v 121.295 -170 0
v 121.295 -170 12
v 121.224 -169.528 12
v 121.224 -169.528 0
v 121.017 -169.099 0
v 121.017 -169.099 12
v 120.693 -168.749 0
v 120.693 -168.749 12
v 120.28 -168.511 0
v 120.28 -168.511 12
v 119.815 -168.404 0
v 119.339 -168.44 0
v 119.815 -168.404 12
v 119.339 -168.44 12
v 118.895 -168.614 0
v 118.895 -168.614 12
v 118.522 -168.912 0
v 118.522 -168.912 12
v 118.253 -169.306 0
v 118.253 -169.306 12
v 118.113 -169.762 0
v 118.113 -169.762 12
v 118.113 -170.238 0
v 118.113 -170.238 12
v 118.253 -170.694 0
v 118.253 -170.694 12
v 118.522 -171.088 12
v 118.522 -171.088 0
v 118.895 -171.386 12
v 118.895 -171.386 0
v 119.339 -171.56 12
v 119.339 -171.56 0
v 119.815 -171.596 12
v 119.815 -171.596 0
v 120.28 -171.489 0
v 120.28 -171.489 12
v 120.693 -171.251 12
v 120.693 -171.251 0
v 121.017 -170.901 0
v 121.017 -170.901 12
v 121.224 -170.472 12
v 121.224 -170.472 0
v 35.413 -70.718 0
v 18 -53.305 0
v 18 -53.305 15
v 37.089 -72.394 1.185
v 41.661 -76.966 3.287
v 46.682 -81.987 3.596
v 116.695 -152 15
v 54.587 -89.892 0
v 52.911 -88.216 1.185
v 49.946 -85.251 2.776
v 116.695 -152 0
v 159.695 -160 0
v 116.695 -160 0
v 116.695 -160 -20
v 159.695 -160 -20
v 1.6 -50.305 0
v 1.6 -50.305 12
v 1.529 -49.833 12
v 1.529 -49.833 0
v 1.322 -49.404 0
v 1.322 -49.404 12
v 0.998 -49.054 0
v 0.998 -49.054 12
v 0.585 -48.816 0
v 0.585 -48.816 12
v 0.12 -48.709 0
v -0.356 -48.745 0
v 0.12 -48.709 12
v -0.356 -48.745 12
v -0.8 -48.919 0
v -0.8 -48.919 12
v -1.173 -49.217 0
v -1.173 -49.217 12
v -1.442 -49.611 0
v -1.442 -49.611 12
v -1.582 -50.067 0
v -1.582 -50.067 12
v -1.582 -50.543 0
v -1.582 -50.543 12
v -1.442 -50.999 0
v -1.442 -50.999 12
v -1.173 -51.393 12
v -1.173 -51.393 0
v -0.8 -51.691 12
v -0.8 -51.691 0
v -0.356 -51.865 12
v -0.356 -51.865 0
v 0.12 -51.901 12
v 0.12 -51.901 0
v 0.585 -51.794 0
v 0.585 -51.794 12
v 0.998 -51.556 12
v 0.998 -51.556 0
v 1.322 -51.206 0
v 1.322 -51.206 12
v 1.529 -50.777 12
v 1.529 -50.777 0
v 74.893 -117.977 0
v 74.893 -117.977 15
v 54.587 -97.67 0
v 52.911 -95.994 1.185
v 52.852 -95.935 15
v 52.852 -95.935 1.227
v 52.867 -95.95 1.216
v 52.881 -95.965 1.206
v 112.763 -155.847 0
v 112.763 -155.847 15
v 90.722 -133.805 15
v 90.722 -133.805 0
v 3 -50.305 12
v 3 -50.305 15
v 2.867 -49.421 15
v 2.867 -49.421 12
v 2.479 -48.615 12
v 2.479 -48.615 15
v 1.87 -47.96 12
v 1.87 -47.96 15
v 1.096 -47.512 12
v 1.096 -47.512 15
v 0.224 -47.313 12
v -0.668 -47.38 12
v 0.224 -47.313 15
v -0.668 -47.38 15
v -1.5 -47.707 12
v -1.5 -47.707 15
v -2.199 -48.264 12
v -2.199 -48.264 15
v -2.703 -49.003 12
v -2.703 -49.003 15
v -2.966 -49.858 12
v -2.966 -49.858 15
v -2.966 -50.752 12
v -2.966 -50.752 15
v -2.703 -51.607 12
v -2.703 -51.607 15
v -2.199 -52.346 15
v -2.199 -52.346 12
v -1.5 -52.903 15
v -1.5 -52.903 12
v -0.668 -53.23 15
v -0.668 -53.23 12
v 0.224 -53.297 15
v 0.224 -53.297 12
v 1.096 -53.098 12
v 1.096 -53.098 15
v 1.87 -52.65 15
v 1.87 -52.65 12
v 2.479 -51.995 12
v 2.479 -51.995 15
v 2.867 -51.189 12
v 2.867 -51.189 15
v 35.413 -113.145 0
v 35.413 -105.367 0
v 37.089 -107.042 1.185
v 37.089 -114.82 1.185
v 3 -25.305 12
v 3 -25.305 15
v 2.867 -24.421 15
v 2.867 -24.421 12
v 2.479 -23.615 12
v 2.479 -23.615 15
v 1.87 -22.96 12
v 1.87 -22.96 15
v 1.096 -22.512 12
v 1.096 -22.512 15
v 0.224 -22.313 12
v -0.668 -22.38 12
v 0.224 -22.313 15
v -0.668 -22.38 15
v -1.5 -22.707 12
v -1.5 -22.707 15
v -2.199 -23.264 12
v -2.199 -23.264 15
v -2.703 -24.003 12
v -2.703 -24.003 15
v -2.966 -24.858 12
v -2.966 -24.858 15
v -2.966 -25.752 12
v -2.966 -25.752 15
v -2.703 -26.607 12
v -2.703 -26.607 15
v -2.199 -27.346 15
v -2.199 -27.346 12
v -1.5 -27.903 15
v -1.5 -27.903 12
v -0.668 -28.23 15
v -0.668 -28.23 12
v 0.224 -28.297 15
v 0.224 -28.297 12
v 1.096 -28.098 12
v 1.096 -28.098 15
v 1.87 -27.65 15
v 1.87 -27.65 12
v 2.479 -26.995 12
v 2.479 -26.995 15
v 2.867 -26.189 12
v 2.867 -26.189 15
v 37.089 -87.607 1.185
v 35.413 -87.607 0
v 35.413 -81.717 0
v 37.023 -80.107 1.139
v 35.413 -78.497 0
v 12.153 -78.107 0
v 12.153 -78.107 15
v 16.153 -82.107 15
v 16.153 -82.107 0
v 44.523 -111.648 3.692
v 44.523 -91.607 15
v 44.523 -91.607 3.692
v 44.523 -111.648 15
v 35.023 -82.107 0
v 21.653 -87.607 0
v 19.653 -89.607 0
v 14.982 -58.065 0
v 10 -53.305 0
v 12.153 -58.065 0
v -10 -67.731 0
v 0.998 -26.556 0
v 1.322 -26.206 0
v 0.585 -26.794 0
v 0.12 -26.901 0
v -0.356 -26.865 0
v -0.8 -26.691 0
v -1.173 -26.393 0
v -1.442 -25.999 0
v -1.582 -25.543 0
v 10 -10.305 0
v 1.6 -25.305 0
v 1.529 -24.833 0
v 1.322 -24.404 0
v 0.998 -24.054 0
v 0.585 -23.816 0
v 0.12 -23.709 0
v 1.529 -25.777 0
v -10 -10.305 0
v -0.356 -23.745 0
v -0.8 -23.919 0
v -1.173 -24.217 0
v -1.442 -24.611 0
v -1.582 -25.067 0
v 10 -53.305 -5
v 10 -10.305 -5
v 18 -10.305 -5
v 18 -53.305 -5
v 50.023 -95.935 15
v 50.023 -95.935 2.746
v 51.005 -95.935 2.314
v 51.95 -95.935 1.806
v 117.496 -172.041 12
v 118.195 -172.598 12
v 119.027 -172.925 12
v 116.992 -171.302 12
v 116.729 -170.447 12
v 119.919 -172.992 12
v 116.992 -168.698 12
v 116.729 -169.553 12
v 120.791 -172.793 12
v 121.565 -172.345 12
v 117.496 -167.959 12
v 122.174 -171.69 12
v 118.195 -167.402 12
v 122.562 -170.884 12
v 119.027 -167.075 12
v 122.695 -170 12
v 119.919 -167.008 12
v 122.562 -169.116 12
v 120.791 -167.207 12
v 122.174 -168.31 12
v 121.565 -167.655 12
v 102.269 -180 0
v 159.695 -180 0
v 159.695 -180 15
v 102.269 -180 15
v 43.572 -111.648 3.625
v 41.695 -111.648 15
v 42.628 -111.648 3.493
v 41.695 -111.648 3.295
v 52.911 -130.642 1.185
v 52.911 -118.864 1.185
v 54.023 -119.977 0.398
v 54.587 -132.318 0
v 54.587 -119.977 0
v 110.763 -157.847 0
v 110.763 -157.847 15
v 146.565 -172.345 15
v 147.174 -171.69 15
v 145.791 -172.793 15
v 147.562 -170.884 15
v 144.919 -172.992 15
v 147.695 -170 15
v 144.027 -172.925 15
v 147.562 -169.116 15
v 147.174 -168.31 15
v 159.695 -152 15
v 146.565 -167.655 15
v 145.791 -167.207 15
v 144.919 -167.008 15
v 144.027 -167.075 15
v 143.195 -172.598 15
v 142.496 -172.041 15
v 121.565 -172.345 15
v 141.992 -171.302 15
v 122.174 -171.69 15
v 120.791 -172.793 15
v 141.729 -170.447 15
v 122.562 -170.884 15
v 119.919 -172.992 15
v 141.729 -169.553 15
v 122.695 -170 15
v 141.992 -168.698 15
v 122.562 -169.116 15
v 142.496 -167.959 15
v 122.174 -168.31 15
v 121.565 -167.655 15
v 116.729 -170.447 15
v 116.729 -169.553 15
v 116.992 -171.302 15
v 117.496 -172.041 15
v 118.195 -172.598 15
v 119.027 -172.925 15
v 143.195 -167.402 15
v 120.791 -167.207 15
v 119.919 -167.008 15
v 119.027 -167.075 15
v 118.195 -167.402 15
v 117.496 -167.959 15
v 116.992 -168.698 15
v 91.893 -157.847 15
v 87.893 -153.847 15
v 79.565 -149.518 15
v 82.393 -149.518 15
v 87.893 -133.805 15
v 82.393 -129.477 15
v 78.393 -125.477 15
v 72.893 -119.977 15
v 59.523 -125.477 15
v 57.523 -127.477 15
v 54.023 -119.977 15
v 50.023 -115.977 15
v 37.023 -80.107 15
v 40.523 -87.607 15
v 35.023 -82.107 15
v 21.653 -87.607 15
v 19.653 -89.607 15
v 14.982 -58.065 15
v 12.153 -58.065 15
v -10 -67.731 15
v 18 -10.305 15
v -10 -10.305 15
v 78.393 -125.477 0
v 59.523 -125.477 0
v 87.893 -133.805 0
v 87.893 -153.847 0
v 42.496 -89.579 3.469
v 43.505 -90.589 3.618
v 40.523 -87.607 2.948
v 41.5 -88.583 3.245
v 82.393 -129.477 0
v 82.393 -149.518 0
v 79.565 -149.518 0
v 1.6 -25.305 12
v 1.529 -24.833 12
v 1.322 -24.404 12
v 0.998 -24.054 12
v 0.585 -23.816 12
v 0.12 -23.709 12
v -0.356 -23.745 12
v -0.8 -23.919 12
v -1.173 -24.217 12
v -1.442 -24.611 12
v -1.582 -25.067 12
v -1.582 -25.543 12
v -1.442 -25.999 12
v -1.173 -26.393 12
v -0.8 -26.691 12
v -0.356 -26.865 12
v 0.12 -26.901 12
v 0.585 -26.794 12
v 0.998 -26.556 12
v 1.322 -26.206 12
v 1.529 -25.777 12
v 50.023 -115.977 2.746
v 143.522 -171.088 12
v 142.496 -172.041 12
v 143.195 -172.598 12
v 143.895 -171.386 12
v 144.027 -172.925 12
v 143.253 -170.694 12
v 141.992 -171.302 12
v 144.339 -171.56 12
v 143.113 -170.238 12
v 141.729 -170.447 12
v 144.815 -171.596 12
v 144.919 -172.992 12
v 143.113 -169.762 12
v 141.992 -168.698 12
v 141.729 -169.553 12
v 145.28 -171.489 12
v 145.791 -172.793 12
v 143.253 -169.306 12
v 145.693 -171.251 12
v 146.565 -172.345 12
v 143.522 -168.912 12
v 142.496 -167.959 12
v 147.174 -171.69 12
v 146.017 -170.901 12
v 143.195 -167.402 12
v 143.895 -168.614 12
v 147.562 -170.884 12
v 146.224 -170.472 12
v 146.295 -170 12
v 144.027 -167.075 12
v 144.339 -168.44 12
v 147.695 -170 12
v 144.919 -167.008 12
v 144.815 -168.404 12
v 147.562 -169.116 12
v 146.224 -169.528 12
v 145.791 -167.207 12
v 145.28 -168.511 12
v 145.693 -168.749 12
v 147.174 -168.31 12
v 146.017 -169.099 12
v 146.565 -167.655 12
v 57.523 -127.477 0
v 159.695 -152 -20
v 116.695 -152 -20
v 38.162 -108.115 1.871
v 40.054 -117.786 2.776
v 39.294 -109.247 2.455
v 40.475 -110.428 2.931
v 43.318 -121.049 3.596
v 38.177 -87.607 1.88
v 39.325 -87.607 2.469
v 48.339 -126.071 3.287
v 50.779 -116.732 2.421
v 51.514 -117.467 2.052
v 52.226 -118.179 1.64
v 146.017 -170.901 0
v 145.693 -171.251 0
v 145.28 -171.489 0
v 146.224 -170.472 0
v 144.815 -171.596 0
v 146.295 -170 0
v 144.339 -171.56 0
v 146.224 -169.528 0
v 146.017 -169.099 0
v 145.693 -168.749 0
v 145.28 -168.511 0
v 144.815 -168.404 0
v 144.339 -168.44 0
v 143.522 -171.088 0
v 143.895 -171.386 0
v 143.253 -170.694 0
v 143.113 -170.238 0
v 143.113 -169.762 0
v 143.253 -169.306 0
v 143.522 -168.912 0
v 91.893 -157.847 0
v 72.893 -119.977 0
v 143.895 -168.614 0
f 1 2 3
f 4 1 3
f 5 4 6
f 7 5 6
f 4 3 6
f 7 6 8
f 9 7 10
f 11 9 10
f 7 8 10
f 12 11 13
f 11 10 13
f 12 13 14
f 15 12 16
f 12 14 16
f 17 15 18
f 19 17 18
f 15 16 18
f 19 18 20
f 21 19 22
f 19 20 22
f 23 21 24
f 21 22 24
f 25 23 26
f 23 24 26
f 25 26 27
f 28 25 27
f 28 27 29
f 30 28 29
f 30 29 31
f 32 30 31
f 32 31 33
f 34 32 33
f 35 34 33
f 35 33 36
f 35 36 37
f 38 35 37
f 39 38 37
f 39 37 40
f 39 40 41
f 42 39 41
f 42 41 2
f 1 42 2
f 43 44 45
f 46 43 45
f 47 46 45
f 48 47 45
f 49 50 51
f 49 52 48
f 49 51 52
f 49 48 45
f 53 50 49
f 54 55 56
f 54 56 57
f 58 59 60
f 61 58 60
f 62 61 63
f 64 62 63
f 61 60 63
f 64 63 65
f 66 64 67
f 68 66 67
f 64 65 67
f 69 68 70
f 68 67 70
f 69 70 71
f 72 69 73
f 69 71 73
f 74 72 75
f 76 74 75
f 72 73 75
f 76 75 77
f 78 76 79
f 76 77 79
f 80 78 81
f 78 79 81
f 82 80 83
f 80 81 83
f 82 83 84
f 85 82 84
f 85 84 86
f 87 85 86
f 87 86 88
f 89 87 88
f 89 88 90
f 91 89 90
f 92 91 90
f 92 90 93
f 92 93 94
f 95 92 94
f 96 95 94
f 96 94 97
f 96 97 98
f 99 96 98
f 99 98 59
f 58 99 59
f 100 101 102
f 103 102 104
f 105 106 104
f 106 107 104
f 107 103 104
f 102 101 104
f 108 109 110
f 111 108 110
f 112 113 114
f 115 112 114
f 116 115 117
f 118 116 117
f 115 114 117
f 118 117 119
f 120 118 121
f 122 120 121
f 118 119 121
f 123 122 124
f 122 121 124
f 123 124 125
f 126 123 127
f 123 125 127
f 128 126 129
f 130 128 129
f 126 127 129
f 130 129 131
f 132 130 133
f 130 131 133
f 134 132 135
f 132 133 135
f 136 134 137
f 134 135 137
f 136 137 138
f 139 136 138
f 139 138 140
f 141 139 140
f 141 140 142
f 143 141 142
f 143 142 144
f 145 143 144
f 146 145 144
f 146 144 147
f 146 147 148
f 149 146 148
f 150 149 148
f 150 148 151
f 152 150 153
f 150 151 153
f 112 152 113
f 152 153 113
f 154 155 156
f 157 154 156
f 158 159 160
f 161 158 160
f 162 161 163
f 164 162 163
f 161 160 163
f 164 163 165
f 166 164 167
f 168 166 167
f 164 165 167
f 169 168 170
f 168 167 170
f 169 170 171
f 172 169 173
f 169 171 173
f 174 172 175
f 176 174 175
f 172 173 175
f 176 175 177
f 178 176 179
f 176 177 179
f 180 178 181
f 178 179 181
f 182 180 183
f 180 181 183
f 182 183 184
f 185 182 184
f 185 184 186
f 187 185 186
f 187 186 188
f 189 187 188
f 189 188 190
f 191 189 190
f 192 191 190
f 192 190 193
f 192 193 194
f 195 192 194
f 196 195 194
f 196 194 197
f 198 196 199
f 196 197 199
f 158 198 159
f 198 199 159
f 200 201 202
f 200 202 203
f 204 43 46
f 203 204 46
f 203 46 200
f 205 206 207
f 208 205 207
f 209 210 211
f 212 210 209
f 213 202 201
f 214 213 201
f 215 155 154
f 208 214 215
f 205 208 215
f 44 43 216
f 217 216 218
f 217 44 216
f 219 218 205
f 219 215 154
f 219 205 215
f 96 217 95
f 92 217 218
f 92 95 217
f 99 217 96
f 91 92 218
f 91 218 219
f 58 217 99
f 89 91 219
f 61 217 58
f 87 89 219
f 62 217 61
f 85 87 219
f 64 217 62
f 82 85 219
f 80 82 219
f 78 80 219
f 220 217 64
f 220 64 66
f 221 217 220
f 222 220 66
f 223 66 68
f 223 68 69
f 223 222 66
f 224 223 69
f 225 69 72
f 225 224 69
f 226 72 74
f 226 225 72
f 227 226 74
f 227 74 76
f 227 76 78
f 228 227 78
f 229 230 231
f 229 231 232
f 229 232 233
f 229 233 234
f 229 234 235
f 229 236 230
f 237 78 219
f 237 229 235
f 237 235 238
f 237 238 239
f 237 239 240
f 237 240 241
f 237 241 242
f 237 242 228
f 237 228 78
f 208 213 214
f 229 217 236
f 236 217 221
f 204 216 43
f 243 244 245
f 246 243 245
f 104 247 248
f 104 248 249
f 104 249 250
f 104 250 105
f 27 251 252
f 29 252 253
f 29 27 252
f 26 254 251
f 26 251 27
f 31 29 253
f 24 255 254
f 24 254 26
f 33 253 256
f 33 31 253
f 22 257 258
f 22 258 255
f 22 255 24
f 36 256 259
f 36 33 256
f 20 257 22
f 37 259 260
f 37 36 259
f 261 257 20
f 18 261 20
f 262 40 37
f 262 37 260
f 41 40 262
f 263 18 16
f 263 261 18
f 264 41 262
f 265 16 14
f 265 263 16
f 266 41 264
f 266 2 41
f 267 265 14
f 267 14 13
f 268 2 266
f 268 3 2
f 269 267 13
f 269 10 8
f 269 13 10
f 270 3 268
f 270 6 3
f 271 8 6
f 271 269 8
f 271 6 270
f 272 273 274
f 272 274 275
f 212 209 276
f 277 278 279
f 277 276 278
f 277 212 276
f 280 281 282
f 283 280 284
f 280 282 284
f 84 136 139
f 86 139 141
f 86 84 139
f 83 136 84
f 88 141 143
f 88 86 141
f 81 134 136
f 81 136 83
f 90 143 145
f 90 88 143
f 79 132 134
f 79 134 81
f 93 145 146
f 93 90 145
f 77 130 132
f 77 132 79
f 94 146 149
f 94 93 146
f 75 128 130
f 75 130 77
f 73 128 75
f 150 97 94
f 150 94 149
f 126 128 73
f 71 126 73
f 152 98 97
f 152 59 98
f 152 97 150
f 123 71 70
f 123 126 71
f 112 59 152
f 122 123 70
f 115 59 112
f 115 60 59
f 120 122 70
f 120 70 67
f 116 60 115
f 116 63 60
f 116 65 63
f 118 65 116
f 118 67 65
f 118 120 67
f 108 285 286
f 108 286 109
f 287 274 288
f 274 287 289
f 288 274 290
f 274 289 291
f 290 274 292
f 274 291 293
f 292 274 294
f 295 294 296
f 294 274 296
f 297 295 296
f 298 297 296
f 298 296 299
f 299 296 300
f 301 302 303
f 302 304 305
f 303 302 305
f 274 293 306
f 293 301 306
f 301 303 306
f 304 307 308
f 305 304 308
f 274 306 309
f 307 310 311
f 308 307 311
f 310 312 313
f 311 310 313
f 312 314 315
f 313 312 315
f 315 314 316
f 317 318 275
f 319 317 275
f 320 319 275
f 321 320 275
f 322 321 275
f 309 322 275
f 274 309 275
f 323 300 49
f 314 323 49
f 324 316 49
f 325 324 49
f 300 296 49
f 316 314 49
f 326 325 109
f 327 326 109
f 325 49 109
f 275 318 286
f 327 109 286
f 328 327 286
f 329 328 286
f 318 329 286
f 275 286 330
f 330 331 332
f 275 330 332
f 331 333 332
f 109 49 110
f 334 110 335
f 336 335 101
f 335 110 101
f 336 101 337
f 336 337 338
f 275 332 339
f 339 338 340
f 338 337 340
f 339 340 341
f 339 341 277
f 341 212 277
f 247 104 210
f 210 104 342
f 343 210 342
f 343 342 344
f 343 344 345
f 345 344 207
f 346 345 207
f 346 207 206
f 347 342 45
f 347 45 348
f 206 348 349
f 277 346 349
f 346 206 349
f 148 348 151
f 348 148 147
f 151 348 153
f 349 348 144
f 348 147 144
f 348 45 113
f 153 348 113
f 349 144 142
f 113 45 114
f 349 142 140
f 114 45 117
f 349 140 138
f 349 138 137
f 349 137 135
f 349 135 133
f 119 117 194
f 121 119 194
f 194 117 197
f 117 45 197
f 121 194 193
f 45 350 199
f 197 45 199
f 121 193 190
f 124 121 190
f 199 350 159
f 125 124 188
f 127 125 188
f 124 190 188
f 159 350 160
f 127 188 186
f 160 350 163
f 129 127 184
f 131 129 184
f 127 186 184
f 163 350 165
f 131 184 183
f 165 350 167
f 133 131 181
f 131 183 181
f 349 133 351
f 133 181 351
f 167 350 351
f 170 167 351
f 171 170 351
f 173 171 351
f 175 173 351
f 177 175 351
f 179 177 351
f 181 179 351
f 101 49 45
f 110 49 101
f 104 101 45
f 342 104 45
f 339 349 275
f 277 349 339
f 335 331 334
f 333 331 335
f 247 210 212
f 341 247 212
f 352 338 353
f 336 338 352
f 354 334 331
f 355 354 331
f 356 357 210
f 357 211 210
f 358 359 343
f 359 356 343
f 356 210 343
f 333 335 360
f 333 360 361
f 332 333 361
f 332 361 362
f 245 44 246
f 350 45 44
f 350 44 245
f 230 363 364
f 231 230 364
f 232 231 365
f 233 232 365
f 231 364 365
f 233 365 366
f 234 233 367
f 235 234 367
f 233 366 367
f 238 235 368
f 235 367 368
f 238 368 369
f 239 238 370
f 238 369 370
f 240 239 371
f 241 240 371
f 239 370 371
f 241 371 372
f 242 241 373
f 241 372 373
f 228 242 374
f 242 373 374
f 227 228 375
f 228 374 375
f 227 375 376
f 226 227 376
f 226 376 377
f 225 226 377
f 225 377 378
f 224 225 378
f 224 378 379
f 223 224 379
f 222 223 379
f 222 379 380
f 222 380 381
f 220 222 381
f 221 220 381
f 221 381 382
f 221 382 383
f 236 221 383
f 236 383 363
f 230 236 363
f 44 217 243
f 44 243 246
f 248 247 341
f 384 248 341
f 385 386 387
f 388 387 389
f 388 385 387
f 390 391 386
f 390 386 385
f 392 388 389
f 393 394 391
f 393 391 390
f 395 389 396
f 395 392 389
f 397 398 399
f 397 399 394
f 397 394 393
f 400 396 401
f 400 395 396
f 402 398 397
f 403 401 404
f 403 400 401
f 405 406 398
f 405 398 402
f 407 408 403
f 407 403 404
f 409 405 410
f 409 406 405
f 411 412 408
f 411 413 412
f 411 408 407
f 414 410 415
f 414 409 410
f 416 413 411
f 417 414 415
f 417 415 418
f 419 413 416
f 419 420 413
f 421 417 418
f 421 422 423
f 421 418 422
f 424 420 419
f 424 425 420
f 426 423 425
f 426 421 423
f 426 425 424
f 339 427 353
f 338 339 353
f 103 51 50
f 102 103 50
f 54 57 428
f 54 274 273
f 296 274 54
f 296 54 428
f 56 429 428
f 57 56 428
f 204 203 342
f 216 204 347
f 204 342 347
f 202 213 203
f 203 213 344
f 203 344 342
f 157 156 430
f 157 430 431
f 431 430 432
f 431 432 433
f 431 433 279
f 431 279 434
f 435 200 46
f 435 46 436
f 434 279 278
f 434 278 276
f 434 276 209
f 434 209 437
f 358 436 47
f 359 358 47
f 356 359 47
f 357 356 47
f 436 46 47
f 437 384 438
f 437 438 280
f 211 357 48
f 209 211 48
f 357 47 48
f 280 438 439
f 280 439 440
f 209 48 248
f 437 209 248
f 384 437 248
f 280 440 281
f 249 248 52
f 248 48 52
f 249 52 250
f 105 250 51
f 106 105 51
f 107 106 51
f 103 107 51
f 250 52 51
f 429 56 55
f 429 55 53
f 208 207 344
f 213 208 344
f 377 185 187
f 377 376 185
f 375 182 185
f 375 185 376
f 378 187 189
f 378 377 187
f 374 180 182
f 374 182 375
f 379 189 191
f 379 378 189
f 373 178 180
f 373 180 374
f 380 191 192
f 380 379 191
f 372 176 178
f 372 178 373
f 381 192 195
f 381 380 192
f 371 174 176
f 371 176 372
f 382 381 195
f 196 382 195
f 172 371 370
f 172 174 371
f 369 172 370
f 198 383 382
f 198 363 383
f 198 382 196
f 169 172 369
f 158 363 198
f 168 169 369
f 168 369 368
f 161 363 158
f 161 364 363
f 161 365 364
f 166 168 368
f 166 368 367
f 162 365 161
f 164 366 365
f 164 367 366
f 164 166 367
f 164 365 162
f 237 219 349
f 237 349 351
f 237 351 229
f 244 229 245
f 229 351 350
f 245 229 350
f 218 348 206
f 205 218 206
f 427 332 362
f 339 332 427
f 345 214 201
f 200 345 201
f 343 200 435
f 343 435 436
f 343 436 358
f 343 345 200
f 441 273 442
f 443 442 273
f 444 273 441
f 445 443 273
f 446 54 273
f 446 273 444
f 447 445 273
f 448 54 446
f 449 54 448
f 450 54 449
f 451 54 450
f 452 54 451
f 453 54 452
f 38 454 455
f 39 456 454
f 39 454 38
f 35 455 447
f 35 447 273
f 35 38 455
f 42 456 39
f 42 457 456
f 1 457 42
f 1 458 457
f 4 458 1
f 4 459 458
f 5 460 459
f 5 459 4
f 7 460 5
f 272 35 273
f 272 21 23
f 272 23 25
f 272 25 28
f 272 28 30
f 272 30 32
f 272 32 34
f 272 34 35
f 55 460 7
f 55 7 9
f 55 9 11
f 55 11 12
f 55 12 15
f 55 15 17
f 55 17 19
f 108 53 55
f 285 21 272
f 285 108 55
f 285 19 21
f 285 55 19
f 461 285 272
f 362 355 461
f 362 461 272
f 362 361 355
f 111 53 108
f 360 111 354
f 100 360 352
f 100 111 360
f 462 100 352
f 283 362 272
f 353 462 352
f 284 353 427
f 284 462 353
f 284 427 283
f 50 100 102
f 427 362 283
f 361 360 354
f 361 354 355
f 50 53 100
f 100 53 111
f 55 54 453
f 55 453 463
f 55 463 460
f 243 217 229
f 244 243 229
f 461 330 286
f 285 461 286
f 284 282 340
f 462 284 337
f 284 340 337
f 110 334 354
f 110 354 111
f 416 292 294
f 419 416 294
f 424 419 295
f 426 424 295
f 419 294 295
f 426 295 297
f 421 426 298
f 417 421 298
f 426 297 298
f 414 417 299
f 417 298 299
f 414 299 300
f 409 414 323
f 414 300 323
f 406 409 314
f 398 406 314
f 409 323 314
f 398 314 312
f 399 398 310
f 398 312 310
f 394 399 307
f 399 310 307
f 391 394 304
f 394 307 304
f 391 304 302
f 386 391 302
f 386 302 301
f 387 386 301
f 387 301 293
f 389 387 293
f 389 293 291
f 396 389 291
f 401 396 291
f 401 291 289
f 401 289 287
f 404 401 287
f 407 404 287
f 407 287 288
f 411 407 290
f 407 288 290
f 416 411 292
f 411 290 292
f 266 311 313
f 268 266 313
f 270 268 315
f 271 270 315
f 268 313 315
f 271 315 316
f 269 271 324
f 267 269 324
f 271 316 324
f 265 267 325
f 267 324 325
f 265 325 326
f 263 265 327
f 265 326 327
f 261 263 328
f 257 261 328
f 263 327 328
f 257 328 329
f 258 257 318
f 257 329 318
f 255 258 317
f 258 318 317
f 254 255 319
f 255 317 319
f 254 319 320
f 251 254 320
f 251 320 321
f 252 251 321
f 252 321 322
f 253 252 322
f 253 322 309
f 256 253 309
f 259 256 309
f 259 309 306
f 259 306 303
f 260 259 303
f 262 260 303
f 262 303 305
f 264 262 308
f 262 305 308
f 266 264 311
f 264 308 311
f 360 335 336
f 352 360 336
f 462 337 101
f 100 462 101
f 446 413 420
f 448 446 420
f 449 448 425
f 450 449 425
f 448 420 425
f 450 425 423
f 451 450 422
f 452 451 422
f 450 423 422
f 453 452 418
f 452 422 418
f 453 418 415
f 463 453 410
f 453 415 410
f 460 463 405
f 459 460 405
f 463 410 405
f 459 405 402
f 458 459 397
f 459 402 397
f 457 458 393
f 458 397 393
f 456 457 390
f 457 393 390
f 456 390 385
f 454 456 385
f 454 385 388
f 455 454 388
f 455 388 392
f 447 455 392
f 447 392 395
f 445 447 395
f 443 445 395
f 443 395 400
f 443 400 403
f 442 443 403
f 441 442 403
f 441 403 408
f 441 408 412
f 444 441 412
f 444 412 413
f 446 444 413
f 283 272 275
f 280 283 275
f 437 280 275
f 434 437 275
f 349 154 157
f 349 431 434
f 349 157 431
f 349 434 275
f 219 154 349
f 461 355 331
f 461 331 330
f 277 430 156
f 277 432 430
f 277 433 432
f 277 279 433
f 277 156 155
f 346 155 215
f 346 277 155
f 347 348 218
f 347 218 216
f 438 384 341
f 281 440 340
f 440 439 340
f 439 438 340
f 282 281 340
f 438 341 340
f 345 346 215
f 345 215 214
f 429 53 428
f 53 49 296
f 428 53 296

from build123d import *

# Parameters (mm, degrees)
EXTRUDE_1_DEPTH     = 15
SKETCH_3_W          = 43
SKETCH_3_H          = 8
EXTRUDE_2_DEPTH     = 35
SKETCH_4_W          = 8
SKETCH_4_H          = 43
EXTRUDE_3_DEPTH     = 35
CUT_EXTRUDE_1_DEPTH = 244.161454645
SKETCH_6_R          = 1.6
CUT_EXTRUDE_2_DEPTH = 244.161454645
SKETCH_7_R          = 3
CUT_EXTRUDE_3_DEPTH = 3
CHAMFER_1_SIZE      = 2.828427125
CHAMFER_1_SIZE_2    = 4
CUT_EXTRUDE_4_DEPTH = 133
SKETCH_10_W         = 8
SKETCH_10_H         = 15
CUT_EXTRUDE_5_DEPTH = 43


with BuildPart() as part:
    # 草图1 → 凸台-拉伸1 (new body)
    with BuildSketch(Plane.XY):
        Polygon((124.695, -160), (159.695, -160), (159.695, -180), (102.268593129, -180), (-10, -67.731406871), (-10, -10.305), (10, -10.305), (10, -45.305), align=None)
    extrude(amount=EXTRUDE_1_DEPTH)

    # 草图3 → 凸台-拉伸2 (add)
    with BuildSketch(Plane.XY.offset(15)):
        with Locations((138.195, -156)):
            Rectangle(SKETCH_3_W, SKETCH_3_H)
    extrude(amount=-EXTRUDE_2_DEPTH)

    # 草图4 → 凸台-拉伸3 (add)
    with BuildSketch(Plane.XY.offset(15)):
        with Locations((14, -31.805)):
            Rectangle(SKETCH_4_W, SKETCH_4_H)
    extrude(amount=-EXTRUDE_3_DEPTH)

    # 草图5 → 切除-拉伸1 (cut, through all)
    with BuildSketch(Plane.XY.offset(15)):
        Polygon((50.023383861, -93.106558454), (50.023383861, -119.976616139), (76.893441546, -119.976616139), align=None)
        Polygon((55.523383861, -125.476616139), (82.393441546, -125.476616139), (82.393441546, -152.346673824), align=None)
        Polygon((12.153326176, -55.236500769), (12.153326176, -82.106558454), (39.023383861, -82.106558454), align=None)
        Polygon((87.893441546, -130.976616139), (87.893441546, -157.846673824), (114.763499231, -157.846673824), align=None)
        Polygon((17.653326176, -87.606558454), (44.523383861, -87.606558454), (44.523383861, -114.476616139), align=None)
    extrude(amount=-CUT_EXTRUDE_1_DEPTH, mode=Mode.SUBTRACT)

    # 草图6 → 切除-拉伸2 (cut, through all)
    with BuildSketch(Plane.XY.offset(15)):
        with Locations((0, -50.305)):
            Circle(SKETCH_6_R)
        with Locations((0, -25.305)):
            Circle(SKETCH_6_R)
        with Locations((119.695, -170)):
            Circle(SKETCH_6_R)
        with Locations((144.695, -170)):
            Circle(SKETCH_6_R)
    extrude(amount=-CUT_EXTRUDE_2_DEPTH, mode=Mode.SUBTRACT)

    # 草图7 → 切除-拉伸3 (cut)
    with BuildSketch(Plane.XY.offset(15)):
        with Locations((0, -25.305)):
            Circle(SKETCH_7_R)
        with Locations((0, -50.305)):
            Circle(SKETCH_7_R)
        with Locations((119.695, -170)):
            Circle(SKETCH_7_R)
        with Locations((144.695, -170)):
            Circle(SKETCH_7_R)
    extrude(amount=-CUT_EXTRUDE_3_DEPTH, mode=Mode.SUBTRACT)

    # 倒角1
    # the kernel refuses this chamfer: 4, 2.828427125 mm, written as the material it adds along each edge
    with BuildSketch(Plane(origin=(82.393441546, -152.346673824, 15), x_dir=(0.05647824947248942, 0.9984038297885898, 0), z_dir=(0, 0, -1)), Plane(origin=(55.523383861, -125.476616139, 15), x_dir=(0.6660419652145875, -0.7459142715976752, 0), z_dir=(0, 0, -1)), Plane(origin=(87.893441546, -130.976616139, 15), x_dir=(-0.05647824947248942, -0.9984038297885898, 0), z_dir=(0, 0, -1)), Plane(origin=(12.153326176, -55.236500769, 15), x_dir=(-0.05647824947249038, -0.9984038297885897, 0), z_dir=(0, 0, -1)), Plane(origin=(44.523383861, -114.476616139, 15), x_dir=(0.05647824947248914, 0.9984038297885898, 0), z_dir=(0, 0, -1)), Plane(origin=(17.653326176, -87.606558454, 15), x_dir=(0.6660419652145882, -0.7459142715976745, 0), z_dir=(0, 0, -1)), Plane(origin=(50.023383861, -93.106558454, 15), x_dir=(-0.05647824947248914, -0.9984038297885898, 0), z_dir=(0, 0, -1))) as chamfer_1_piece_1:
        Polygon((CHAMFER_1_SIZE * 0.998403829699, -CHAMFER_1_SIZE * 0.0564782494674), (CHAMFER_1_SIZE_2 * 0.666041965215, -CHAMFER_1_SIZE_2 * 0.745914271598), (0, 0), align=None)
    extrude(amount=15)
    with BuildSketch(Plane(origin=(82.393441546, -125.476616139, 15), x_dir=(0.02749587661058555, -0.9996219169112968, 0), z_dir=(0, 0, -1)), Plane(origin=(87.893441546, -157.846673824, 15), x_dir=(-0.02749587661058555, 0.9996219169112968, 0), z_dir=(0, 0, -1)), Plane(origin=(12.153326176, -82.106558454, 15), x_dir=(-0.02749587661058651, 0.9996219169112968, 0), z_dir=(0, 0, -1)), Plane(origin=(44.523383861, -87.606558454, 15), x_dir=(0.027495876610585647, -0.9996219169112968, 0), z_dir=(0, 0, -1)), Plane(origin=(50.023383861, -119.976616139, 15), x_dir=(-0.027495876610585647, 0.9996219169112968, 0), z_dir=(0, 0, -1))) as chamfer_1_piece_2:
        Polygon((CHAMFER_1_SIZE_2 * 0.999621916911, CHAMFER_1_SIZE_2 * 0.0274958766106), (-CHAMFER_1_SIZE_2 * 0.0274958766106, CHAMFER_1_SIZE_2 * 0.999621916911), (0, 0), align=None)
    extrude(amount=15)
    with BuildSketch(Plane(origin=(114.763499231, -157.846673824, 15), x_dir=(-0.9996219169112968, -0.0274958766105891, 0), z_dir=(0, 0, -1)), Plane(origin=(39.023383861, -82.106558454, 15), x_dir=(-0.9996219169112968, -0.027495876610585647, 0), z_dir=(0, 0, -1)), Plane(origin=(76.893441546, -119.976616139, 15), x_dir=(-0.9996219169112968, -0.027495876610585647, 0), z_dir=(0, 0, -1))) as chamfer_1_piece_3:
        Polygon((CHAMFER_1_SIZE_2 * 0.999621916911, CHAMFER_1_SIZE_2 * 0.0274958766106), (CHAMFER_1_SIZE * 0.687396915203, CHAMFER_1_SIZE * 0.726281956812), (0, 0), align=None)
    extrude(amount=15)

    # 草图9 → 切除-拉伸4 (cut)
    with BuildSketch(Plane(origin=(0, -10.305, 0), x_dir=(1, 0, 0), z_dir=(0, 1, 0))):
        with BuildLine():
            Line((54.586563641, 0), (35.413436359, 0))
            Line((35.413436359, 0), (37.089053206, -1.18512051))
            ThreePointArc((37.089053206, -1.18512051), (45, -3.7), (52.910946794, -1.18512051))
            Line((52.910946794, -1.18512051), (54.586563641, 0))
        make_face()
    extrude(amount=-CUT_EXTRUDE_4_DEPTH, mode=Mode.SUBTRACT)

    # 草图10 → 切除-拉伸5 (cut)
    with BuildSketch(Plane(origin=(0, -10.305, 0), x_dir=(1, 0, 0), z_dir=(0, 1, 0))):
        with Locations((14, 12.5)):
            Rectangle(SKETCH_10_W, SKETCH_10_H)
    extrude(amount=-CUT_EXTRUDE_5_DEPTH, mode=Mode.SUBTRACT)


solid = part.part
